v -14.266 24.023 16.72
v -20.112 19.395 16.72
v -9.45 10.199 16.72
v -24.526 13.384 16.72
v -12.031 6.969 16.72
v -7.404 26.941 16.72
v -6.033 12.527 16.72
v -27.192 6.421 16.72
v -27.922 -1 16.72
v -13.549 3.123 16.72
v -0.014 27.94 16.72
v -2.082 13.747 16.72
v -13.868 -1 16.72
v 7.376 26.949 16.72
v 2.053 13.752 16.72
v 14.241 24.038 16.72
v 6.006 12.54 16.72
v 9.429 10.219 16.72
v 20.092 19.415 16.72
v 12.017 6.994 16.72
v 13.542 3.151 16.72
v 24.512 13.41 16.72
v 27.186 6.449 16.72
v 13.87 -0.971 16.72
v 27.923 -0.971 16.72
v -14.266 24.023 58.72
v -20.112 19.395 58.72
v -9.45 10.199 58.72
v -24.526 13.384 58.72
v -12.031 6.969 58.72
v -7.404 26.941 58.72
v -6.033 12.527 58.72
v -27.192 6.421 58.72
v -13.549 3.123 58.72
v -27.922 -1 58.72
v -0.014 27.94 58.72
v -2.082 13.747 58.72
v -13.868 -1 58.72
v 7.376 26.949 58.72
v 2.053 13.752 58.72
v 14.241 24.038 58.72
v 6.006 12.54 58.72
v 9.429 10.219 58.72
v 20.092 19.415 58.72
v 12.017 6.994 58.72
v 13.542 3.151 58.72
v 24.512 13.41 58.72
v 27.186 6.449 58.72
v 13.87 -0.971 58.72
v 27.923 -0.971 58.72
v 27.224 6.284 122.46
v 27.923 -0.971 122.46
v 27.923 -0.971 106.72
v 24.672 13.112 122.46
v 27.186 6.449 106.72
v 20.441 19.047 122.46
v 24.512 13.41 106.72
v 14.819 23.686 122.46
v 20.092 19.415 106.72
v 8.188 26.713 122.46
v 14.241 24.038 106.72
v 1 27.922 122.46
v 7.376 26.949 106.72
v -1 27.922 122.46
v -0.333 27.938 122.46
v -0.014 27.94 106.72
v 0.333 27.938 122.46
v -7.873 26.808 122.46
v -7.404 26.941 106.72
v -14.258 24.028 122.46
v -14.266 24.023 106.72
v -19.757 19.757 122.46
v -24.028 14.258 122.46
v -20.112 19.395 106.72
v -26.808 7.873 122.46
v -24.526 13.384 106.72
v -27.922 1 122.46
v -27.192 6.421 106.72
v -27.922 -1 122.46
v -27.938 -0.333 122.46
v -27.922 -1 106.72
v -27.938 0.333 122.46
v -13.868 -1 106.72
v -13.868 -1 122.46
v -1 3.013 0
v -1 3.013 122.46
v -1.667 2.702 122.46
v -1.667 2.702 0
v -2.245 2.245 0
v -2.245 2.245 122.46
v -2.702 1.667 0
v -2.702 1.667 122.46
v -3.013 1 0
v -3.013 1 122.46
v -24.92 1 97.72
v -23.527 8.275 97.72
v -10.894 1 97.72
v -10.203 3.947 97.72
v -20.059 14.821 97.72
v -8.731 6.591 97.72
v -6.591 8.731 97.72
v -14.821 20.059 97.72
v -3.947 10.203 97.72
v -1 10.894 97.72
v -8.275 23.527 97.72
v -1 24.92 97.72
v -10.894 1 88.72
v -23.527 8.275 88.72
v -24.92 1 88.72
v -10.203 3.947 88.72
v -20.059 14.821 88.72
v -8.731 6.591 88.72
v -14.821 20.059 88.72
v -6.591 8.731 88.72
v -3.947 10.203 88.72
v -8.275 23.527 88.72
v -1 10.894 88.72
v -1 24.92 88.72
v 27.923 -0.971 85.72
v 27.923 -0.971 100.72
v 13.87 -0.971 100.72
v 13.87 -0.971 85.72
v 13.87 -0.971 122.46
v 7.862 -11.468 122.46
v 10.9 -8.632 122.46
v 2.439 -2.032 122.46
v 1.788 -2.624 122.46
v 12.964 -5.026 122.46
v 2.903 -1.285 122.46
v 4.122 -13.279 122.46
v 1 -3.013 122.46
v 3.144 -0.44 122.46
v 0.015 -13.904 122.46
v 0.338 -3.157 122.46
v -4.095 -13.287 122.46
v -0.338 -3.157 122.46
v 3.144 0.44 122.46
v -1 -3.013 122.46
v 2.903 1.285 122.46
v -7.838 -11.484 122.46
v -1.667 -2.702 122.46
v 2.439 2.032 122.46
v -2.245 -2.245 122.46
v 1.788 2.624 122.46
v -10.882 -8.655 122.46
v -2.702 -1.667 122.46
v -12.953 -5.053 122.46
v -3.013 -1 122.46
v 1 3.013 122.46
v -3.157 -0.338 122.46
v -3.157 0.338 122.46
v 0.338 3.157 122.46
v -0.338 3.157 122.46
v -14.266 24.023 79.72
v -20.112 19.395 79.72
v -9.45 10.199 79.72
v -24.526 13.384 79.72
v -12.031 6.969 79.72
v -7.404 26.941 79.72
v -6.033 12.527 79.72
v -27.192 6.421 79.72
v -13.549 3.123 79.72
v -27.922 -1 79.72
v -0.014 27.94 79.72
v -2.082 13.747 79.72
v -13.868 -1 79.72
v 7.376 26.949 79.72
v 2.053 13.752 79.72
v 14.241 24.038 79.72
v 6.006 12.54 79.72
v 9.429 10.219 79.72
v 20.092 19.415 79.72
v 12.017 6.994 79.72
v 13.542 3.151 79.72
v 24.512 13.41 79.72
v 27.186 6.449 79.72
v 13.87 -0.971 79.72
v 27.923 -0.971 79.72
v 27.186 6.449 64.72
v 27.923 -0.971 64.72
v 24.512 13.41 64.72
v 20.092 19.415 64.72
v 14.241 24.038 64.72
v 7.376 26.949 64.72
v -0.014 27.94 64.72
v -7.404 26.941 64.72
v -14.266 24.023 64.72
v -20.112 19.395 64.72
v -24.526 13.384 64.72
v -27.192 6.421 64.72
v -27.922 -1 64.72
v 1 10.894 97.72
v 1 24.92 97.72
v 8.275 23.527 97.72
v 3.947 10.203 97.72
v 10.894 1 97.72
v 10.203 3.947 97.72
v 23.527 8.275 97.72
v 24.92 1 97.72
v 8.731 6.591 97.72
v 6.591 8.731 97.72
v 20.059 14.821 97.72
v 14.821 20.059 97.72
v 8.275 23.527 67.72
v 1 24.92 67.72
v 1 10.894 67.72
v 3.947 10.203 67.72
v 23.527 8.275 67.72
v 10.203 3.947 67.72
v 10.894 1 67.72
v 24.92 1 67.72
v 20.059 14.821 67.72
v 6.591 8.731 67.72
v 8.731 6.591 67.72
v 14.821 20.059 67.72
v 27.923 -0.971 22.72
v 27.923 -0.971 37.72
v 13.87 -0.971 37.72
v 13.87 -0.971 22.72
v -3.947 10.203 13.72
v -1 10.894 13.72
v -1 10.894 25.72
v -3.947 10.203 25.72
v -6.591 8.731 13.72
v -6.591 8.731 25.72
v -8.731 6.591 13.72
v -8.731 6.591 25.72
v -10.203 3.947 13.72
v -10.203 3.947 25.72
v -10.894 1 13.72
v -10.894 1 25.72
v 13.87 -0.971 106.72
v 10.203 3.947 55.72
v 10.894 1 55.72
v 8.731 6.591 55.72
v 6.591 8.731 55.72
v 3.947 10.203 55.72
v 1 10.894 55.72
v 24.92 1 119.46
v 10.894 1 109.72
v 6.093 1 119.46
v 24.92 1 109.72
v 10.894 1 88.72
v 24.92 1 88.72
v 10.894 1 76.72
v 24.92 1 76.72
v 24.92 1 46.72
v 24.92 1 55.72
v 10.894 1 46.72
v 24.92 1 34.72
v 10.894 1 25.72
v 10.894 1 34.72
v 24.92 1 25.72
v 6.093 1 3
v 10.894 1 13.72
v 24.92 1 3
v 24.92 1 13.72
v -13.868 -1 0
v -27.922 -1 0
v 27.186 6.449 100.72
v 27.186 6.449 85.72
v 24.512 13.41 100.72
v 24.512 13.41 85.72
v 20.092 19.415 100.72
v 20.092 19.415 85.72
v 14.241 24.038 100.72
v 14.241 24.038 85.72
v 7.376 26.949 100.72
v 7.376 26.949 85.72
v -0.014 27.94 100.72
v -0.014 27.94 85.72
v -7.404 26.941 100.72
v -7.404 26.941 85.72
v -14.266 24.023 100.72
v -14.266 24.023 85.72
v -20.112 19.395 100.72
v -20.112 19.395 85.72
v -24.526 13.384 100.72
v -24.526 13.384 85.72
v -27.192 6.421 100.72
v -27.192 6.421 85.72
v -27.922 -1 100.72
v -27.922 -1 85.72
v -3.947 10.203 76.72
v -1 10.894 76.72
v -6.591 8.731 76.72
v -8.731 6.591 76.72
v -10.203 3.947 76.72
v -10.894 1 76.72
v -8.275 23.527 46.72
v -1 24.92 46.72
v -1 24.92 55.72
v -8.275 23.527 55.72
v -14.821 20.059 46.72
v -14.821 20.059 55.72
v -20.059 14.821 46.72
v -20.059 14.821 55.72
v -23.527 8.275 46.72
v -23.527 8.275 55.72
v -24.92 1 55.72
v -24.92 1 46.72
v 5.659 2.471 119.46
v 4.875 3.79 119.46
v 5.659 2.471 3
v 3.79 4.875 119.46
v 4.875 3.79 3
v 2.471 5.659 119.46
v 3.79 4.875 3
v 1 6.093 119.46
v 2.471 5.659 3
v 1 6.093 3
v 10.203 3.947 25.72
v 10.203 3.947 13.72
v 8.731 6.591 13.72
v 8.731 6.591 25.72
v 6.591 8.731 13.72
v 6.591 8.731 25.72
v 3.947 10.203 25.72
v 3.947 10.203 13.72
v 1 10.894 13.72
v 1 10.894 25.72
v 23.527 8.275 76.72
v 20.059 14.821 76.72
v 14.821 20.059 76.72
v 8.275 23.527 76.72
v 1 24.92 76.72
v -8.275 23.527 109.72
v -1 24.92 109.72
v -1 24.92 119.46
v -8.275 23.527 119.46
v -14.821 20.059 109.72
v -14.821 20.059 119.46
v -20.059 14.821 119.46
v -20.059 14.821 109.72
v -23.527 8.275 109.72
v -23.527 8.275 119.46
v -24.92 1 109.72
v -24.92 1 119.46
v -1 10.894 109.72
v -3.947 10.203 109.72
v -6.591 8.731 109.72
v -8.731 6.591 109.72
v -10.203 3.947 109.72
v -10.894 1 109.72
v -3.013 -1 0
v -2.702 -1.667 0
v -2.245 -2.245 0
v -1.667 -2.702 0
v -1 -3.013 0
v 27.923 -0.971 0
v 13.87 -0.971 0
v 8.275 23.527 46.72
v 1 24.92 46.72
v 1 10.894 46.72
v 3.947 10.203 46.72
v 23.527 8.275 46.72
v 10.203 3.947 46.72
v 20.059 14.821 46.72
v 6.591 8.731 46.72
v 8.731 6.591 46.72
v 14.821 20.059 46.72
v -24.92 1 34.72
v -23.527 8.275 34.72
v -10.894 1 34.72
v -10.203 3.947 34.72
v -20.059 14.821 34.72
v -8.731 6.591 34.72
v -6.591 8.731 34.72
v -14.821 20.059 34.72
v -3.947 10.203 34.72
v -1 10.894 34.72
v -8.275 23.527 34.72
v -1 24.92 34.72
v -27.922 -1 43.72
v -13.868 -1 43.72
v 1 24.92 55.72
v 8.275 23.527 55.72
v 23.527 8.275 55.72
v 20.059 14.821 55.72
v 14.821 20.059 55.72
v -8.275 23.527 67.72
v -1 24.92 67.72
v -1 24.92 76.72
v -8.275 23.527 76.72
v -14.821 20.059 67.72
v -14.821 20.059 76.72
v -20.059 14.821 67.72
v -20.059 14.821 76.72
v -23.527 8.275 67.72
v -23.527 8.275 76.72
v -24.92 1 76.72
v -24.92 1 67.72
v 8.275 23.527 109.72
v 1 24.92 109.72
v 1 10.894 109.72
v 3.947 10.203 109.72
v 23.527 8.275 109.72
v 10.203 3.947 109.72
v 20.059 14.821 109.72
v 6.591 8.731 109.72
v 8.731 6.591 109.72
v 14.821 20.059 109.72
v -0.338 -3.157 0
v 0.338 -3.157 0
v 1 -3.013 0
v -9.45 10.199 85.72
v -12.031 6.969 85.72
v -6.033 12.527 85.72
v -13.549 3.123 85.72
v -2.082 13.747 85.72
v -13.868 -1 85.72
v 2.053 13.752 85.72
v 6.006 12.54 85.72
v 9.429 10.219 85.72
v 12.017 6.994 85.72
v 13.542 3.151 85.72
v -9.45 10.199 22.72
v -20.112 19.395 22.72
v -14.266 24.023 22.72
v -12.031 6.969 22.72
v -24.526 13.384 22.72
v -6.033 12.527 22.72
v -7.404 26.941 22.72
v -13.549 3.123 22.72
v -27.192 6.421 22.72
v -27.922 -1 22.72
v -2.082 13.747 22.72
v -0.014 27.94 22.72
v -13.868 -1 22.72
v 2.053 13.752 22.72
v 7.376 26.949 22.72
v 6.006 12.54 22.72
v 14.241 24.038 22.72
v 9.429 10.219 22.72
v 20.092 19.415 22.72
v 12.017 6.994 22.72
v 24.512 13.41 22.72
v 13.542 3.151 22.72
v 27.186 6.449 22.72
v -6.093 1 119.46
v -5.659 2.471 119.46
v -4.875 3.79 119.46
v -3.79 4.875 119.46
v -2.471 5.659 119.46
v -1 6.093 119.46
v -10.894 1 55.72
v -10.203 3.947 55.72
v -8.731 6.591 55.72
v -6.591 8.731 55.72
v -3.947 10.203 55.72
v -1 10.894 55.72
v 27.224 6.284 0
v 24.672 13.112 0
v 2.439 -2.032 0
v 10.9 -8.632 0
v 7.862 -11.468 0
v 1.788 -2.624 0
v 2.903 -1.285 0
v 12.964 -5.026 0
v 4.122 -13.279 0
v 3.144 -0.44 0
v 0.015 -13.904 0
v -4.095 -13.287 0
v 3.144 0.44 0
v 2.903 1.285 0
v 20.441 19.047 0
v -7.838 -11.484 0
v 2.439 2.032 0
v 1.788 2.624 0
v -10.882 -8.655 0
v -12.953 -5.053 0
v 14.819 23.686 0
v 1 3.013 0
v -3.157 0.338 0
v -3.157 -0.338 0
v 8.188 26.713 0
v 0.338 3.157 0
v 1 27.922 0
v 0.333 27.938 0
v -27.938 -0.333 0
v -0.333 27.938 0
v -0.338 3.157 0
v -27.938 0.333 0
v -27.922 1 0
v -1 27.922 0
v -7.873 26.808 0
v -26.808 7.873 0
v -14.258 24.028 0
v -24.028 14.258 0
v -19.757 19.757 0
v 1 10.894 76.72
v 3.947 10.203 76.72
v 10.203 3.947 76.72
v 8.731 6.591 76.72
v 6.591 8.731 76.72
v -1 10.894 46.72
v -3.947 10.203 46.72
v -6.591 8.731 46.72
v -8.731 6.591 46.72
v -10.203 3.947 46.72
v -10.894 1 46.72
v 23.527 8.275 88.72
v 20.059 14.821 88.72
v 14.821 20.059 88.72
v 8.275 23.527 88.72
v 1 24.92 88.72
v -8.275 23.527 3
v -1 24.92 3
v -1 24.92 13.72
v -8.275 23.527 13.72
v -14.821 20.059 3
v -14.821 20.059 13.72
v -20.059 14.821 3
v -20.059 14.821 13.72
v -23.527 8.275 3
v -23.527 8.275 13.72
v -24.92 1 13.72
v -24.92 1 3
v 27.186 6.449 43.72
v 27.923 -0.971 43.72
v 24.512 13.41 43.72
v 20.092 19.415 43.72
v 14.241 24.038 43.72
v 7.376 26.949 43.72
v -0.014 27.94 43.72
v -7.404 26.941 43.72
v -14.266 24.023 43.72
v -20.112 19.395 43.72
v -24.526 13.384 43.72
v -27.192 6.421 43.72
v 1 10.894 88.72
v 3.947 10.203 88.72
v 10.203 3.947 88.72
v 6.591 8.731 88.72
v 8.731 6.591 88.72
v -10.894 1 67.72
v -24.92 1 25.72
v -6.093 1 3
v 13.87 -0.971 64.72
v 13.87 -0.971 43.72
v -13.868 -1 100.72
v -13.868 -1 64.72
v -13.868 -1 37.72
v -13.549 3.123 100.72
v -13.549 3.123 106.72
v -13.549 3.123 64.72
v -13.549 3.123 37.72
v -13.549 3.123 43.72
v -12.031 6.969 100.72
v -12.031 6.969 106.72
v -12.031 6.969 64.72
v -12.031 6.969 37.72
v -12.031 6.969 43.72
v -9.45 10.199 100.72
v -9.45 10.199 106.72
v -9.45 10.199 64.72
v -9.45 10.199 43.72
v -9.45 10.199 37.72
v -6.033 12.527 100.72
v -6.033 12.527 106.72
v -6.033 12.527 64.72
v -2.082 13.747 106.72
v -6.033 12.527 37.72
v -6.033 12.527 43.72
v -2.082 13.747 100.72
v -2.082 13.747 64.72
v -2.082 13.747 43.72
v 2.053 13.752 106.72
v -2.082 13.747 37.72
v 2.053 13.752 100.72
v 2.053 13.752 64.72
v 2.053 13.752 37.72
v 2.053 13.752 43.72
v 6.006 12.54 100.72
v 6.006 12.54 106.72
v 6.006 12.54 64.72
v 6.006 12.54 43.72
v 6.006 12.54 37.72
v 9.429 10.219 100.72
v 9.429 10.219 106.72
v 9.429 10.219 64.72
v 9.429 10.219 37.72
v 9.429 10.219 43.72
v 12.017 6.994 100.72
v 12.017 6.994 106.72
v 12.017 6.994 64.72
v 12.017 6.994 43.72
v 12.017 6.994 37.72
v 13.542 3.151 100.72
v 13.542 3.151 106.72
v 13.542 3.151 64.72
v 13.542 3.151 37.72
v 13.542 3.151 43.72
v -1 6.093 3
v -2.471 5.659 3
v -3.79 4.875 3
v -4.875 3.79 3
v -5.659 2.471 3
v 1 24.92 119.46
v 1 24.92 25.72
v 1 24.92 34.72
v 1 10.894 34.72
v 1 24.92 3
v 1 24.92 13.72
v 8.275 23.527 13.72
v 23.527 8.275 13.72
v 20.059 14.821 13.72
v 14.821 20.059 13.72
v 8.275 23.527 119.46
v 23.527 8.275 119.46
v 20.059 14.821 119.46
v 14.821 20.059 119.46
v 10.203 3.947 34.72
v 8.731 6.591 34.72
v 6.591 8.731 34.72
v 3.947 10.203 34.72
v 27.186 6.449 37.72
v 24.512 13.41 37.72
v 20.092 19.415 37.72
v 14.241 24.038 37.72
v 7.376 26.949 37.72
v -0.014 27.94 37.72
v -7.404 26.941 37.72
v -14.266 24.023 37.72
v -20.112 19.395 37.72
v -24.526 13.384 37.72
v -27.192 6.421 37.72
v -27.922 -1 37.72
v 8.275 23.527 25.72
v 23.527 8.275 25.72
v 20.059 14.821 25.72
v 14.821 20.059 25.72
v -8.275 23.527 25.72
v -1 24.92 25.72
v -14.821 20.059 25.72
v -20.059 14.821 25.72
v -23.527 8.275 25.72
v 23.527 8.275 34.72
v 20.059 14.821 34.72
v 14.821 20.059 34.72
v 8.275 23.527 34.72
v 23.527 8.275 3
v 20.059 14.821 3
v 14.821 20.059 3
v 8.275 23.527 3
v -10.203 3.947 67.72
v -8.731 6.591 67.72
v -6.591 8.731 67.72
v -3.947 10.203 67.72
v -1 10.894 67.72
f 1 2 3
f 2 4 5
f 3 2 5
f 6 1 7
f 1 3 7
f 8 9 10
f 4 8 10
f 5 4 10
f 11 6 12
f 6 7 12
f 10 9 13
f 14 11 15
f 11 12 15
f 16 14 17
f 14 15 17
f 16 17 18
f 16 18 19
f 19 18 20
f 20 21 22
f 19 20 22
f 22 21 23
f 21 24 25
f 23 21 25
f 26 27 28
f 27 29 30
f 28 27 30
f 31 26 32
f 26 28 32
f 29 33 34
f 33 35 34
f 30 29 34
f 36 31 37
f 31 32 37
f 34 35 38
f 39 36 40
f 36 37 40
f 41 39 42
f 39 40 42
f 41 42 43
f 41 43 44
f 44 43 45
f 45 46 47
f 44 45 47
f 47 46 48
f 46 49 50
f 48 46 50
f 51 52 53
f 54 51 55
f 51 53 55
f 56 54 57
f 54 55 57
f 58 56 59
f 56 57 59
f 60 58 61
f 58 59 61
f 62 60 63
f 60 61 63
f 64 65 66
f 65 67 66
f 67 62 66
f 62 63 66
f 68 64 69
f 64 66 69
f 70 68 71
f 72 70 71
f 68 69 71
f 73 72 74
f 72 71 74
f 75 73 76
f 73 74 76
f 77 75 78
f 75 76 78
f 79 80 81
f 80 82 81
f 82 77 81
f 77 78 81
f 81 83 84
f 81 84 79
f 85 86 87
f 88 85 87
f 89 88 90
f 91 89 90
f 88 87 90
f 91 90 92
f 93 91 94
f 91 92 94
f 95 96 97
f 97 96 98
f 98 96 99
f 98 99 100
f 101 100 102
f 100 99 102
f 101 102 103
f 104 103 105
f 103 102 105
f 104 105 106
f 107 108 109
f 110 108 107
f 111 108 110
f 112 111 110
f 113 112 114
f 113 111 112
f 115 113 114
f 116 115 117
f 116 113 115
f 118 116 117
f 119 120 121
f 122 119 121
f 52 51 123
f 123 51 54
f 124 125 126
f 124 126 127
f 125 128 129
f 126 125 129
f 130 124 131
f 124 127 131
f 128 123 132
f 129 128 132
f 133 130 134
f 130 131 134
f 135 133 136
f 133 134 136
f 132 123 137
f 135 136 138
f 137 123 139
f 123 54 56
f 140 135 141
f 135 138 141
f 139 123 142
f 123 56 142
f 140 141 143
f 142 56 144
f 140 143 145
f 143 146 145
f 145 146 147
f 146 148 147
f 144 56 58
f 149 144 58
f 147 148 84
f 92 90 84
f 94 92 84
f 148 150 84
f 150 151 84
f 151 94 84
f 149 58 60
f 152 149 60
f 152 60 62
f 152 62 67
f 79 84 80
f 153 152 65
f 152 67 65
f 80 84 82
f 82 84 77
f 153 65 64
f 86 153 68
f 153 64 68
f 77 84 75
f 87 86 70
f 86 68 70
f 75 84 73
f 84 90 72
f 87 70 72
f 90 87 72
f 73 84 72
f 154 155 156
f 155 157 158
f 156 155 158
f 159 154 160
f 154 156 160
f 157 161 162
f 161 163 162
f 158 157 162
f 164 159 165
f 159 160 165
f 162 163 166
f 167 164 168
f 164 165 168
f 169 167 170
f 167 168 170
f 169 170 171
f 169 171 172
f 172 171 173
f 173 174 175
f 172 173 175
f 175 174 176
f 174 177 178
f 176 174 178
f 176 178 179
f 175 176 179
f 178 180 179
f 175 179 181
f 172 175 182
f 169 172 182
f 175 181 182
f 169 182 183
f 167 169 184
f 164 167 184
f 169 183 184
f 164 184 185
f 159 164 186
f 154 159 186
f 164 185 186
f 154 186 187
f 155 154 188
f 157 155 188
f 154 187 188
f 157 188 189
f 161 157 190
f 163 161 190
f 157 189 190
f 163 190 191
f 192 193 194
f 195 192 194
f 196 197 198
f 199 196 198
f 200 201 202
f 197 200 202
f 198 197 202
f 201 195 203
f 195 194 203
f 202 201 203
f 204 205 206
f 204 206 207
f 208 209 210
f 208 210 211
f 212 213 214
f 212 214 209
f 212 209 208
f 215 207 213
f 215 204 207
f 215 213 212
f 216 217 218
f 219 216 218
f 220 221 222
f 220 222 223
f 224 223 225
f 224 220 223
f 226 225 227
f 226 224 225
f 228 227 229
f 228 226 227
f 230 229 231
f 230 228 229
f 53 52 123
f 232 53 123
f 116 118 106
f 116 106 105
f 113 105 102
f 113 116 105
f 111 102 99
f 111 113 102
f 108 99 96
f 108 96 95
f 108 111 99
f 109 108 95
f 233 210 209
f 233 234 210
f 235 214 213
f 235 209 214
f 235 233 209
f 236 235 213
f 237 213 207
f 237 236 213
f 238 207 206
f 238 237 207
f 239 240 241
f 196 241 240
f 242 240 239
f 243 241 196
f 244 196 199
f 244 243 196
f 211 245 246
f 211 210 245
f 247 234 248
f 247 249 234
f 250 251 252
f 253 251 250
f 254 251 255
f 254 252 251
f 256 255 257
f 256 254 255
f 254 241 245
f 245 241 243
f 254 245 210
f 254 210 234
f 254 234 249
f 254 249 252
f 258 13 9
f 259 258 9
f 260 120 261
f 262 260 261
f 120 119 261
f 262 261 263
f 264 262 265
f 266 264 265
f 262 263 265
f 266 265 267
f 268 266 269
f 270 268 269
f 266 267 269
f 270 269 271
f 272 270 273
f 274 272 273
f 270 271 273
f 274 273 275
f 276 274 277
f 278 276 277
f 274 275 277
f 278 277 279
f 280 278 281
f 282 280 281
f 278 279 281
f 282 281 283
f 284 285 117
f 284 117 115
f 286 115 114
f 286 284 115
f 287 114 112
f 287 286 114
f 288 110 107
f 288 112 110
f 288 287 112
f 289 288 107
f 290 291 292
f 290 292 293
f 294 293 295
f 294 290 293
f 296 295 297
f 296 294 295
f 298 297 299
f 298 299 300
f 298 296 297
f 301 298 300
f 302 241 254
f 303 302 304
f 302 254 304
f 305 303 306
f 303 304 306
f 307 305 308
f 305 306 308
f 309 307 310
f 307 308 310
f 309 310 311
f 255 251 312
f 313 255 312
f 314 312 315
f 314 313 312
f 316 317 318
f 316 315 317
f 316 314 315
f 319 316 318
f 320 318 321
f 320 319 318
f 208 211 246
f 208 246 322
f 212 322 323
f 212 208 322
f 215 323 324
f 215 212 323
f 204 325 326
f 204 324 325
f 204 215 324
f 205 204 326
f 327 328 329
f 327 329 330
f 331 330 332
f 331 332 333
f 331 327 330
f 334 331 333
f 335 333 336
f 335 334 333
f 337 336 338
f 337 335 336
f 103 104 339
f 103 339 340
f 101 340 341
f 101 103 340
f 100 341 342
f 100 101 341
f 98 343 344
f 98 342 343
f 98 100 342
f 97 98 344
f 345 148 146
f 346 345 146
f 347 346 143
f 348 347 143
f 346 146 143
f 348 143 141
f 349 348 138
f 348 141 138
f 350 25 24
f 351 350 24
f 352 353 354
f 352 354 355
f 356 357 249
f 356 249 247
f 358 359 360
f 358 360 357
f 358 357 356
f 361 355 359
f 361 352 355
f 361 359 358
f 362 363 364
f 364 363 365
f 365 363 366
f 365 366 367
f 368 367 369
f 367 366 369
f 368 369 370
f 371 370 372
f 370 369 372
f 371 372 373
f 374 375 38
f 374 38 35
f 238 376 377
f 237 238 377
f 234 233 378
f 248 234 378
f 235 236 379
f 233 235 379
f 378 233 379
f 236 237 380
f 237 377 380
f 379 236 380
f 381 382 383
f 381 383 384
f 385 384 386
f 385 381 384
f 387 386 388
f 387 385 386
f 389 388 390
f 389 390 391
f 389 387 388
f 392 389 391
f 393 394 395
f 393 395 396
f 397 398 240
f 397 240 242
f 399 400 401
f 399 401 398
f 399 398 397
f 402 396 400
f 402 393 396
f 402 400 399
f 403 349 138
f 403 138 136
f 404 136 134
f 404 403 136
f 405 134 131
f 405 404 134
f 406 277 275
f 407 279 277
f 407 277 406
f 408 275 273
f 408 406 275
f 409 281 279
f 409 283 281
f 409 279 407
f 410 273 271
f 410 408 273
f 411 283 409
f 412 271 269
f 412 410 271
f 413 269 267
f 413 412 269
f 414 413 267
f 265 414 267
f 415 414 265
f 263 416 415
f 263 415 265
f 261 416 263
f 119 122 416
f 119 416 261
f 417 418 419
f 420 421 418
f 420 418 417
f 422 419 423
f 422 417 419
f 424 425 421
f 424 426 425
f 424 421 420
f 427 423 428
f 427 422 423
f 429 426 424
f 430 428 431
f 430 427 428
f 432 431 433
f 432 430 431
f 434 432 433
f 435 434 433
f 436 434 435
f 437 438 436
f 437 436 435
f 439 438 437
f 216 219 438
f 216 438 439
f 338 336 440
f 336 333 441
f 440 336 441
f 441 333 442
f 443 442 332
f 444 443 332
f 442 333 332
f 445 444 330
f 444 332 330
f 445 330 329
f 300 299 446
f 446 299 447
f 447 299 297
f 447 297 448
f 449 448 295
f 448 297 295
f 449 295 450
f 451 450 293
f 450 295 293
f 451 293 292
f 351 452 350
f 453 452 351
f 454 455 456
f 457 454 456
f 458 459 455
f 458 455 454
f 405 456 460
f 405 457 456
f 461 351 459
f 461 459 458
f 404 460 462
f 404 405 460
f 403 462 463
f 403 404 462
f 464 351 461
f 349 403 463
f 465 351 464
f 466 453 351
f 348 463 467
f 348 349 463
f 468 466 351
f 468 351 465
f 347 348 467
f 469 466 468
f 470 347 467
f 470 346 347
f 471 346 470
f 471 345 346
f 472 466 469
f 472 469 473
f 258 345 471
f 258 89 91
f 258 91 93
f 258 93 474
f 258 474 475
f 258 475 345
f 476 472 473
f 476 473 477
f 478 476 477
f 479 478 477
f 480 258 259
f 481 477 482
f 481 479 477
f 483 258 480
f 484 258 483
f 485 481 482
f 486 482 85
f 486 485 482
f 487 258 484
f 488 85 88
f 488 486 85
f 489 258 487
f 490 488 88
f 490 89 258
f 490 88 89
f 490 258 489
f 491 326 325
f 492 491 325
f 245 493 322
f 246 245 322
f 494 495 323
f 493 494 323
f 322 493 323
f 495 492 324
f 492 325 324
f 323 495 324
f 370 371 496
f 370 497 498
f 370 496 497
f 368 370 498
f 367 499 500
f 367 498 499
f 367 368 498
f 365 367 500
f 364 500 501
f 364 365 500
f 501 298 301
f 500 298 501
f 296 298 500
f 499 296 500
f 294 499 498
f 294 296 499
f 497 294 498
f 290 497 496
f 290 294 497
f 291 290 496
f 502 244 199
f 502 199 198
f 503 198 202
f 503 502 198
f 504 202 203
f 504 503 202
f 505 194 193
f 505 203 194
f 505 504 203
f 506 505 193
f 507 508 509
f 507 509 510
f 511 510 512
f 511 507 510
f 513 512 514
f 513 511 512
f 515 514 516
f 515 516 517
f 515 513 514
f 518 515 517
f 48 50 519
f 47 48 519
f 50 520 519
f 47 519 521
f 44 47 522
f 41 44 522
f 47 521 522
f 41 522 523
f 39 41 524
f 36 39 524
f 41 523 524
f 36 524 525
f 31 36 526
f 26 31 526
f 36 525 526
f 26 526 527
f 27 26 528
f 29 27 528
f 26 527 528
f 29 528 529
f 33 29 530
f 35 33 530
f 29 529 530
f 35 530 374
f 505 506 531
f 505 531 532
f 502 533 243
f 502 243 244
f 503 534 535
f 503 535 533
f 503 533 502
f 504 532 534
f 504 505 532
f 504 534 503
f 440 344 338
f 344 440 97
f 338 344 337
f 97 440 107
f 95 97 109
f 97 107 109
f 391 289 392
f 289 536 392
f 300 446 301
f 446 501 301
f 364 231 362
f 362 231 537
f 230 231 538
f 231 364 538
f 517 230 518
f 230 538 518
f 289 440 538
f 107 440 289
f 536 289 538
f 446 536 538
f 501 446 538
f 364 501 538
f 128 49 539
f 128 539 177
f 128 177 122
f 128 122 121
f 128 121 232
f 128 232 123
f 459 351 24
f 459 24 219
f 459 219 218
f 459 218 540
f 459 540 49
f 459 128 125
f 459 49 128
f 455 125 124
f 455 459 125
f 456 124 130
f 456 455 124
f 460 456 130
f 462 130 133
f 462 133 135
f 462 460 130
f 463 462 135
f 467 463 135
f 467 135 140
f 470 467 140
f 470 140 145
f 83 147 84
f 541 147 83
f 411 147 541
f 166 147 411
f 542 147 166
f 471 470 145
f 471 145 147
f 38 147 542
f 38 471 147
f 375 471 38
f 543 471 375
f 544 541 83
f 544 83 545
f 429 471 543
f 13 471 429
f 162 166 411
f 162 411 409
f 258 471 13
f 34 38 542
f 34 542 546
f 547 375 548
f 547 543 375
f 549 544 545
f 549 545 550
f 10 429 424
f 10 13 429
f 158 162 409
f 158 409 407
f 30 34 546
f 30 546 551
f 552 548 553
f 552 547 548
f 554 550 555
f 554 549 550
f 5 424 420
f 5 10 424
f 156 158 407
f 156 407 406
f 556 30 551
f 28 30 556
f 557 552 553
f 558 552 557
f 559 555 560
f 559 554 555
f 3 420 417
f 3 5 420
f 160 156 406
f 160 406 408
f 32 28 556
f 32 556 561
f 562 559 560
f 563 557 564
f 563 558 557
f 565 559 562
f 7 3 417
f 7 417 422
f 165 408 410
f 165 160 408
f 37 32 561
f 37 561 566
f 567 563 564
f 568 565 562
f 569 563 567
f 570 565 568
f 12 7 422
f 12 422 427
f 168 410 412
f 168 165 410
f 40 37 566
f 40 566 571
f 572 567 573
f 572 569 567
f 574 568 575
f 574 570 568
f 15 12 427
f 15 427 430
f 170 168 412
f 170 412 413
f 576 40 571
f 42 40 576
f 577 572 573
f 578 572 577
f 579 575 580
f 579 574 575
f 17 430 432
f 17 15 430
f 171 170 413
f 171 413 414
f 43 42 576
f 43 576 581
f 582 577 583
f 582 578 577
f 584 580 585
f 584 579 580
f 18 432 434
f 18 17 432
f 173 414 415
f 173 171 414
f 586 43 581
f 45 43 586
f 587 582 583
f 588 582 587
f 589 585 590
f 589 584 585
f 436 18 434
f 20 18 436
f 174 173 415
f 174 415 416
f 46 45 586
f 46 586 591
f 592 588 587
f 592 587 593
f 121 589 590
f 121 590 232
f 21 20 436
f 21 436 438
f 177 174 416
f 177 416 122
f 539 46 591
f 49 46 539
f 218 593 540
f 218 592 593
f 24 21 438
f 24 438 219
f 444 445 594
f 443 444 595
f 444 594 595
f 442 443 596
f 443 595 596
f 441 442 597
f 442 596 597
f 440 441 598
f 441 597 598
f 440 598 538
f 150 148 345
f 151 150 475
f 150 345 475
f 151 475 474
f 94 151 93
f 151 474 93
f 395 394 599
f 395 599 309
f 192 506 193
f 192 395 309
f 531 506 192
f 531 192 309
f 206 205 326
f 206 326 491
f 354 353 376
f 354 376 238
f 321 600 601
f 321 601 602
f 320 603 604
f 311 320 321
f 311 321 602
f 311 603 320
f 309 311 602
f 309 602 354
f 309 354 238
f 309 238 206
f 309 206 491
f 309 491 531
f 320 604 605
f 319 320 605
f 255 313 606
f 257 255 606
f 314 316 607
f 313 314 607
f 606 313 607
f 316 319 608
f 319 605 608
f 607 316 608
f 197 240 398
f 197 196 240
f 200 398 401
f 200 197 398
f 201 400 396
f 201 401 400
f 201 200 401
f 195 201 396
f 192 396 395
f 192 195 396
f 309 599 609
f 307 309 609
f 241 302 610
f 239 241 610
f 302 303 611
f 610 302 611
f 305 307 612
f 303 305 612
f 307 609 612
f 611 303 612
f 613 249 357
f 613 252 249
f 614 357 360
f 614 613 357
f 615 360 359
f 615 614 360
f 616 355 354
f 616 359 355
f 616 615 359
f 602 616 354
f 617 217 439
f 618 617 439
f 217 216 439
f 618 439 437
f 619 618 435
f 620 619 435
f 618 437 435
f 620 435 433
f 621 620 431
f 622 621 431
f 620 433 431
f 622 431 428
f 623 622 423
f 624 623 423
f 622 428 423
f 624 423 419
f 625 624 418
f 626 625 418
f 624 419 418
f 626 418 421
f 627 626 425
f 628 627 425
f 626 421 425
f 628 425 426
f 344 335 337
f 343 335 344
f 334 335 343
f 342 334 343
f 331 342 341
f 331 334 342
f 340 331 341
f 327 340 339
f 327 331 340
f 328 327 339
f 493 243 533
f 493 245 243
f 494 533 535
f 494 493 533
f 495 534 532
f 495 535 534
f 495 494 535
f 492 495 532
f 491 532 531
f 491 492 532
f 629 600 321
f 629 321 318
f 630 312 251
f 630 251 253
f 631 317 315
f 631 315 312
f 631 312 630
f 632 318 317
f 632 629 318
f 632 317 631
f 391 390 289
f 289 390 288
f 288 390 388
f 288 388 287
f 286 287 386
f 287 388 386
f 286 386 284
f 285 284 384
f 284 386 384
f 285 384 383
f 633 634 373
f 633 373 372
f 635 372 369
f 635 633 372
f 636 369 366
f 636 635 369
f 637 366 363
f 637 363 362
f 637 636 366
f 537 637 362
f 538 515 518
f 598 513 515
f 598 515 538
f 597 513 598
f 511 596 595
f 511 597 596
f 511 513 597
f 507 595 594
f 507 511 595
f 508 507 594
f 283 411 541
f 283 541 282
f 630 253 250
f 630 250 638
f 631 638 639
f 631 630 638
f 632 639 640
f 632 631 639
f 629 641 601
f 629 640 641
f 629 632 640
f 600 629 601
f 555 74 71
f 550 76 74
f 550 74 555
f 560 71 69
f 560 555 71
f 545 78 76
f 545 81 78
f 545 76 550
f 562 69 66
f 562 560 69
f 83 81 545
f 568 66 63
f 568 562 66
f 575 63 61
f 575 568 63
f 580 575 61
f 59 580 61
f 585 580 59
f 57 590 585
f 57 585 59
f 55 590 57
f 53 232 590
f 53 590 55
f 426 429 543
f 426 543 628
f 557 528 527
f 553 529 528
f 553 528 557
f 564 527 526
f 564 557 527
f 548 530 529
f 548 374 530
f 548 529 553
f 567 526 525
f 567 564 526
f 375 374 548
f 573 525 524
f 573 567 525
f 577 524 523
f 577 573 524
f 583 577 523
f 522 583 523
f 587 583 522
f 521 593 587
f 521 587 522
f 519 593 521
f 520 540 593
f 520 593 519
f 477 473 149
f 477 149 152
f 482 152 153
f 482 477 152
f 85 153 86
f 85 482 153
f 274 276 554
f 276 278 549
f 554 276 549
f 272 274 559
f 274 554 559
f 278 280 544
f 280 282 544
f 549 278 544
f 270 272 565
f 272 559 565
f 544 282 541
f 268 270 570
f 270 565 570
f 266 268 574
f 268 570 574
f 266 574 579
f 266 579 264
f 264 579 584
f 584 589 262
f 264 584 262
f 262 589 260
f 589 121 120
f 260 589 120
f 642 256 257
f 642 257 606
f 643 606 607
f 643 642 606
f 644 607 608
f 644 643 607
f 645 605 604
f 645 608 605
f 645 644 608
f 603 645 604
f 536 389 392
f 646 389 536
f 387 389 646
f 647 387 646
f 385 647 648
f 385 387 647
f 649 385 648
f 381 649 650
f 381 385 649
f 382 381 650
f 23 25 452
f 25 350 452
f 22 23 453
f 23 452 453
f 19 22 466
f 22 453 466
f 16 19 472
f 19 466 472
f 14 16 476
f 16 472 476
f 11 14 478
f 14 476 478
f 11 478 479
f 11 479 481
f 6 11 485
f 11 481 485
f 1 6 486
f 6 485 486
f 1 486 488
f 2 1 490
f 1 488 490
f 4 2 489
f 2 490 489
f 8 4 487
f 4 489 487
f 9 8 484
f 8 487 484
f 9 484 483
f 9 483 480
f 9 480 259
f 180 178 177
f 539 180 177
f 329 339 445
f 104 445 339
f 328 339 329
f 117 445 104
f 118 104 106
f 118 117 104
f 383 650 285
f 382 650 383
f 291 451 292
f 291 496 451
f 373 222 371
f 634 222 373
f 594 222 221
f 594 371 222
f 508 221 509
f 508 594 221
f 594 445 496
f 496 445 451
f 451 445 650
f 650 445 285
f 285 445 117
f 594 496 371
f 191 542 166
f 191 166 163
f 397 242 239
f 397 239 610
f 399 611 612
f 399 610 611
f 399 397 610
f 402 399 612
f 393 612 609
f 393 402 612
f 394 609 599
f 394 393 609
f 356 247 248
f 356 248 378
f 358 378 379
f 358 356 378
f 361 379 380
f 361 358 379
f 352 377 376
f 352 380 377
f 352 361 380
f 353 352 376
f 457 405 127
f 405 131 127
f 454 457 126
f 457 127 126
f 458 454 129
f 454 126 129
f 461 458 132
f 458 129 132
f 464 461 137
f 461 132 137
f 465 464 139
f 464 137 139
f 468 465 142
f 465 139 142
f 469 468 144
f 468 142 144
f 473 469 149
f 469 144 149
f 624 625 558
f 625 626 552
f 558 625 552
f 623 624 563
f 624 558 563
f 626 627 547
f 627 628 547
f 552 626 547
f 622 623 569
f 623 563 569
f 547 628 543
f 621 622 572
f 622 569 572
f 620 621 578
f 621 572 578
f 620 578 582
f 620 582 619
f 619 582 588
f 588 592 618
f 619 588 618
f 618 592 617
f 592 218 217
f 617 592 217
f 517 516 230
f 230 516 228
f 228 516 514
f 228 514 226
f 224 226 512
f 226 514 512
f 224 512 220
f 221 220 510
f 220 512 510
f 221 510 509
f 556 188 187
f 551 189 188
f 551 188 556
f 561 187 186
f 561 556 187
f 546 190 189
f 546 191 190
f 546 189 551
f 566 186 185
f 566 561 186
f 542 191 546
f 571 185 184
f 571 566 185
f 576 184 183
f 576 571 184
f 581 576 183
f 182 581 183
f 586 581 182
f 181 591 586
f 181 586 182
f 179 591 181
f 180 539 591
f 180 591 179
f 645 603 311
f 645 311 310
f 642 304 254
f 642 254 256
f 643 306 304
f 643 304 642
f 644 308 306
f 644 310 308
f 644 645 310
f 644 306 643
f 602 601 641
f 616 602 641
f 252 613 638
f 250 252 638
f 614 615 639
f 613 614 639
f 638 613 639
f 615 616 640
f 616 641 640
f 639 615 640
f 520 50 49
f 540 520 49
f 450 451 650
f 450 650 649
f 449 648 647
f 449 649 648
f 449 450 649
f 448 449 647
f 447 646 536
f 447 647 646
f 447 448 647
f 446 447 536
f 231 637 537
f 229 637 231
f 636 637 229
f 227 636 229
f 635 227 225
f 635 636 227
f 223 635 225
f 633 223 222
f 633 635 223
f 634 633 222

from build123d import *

# Parameters (mm, degrees)
SKETCH3_R            = 27.94
BOSS_EXTRUDE2_DEPTH  = 122.46
SKETCH5_R            = 3.175
CUT_EXTRUDE1_DEPTH   = 129.676877488
SKETCH4_W            = 14
SKETCH4_H            = 6
SHELL1_START         = 3
SHELL1_OUTLINE_R     = 10.94
SHELL1_OUTLINE_R_2   = 6.175
SHELL1_DEPTH         = 116.46
SHELL1_2_OUTLINE_R   = 24.94
SHELL1_2_OUTLINE_R_2 = 10.94
SHELL1_2_DEPTH       = 10.72
SHELL1_START_2       = 109.72
SHELL1_3_OUTLINE_R   = 24.94
SHELL1_3_OUTLINE_R_2 = 10.94
SHELL1_3_DEPTH       = 9.74
SHELL1_START_3       = 25.72
SHELL1_4_OUTLINE_R   = 24.94
SHELL1_4_OUTLINE_R_2 = 10.94
SHELL1_4_DEPTH       = 9
SHELL1_START_4       = 46.72
SHELL1_5_OUTLINE_R   = 24.94
SHELL1_5_OUTLINE_R_2 = 10.94
SHELL1_5_DEPTH       = 9
SHELL1_START_5       = 67.72
SHELL1_6_OUTLINE_R   = 24.94
SHELL1_6_OUTLINE_R_2 = 10.94
SHELL1_6_DEPTH       = 9
SHELL1_START_6       = 88.72
SHELL1_7_OUTLINE_R   = 24.94
SHELL1_7_OUTLINE_R_2 = 10.94
SHELL1_7_DEPTH       = 9
BOSS_EXTRUDE3_REACH  = 130.677
SKETCH13_W           = 16.483162312
SKETCH13_H           = 6
CUT_EXTRUDE3_DEPTH   = 123
BOSS_EXTRUDE5_START  = -122.46
BOSS_EXTRUDE5_DEPTH  = 122.46


# Read off the part's stored shape, not the designer's step: Shell1
with BuildPart() as part:
    # Sketch3 → Boss-Extrude2 (new body)
    with BuildSketch(Plane.XY):
        Circle(SKETCH3_R)
    extrude(amount=BOSS_EXTRUDE2_DEPTH)

    # Sketch5 → Cut-Extrude1 (cut, through all)
    with BuildSketch(Plane.XY.offset(122.46)):
        Circle(SKETCH5_R)
    extrude(amount=-CUT_EXTRUDE1_DEPTH, mode=Mode.SUBTRACT)

    # Sketch4 → Cut-Revolve1 (revolve, cut)
    with BuildSketch(Plane(origin=(0, 0, 0), x_dir=(1, 0, 0), z_dir=(0, 1, 0)), mode=Mode.PRIVATE) as cut_revolve1_sk:
        with Locations((-20.94, -103.72)):
            Rectangle(SKETCH4_W, SKETCH4_H)
        with Locations((-20.94, -82.72)):
            Rectangle(SKETCH4_W, SKETCH4_H)
        with Locations((-20.94, -61.72)):
            Rectangle(SKETCH4_W, SKETCH4_H)
        with Locations((-20.94, -40.72)):
            Rectangle(SKETCH4_W, SKETCH4_H)
        with Locations((-20.94, -19.72)):
            Rectangle(SKETCH4_W, SKETCH4_H)
    revolve(cut_revolve1_sk.sketch.rotate(Axis((0, 0, 122.46), (0, 0, -1)), 180), axis=Axis((0, 0, 122.46), (0, 0, -1)), mode=Mode.SUBTRACT)

    # Shell1 outline → Shell1 (cut)
    with BuildSketch(Plane.XY.offset(SHELL1_START)):
        Circle(SHELL1_OUTLINE_R)
        Circle(SHELL1_OUTLINE_R_2, mode=Mode.SUBTRACT)
    extrude(amount=SHELL1_DEPTH, mode=Mode.SUBTRACT)

    # Shell1 2 outline → Shell1 2 (cut)
    with BuildSketch(Plane.XY.offset(SHELL1_START)):
        Circle(SHELL1_2_OUTLINE_R)
        Circle(SHELL1_2_OUTLINE_R_2, mode=Mode.SUBTRACT)
    extrude(amount=SHELL1_2_DEPTH, mode=Mode.SUBTRACT)

    # Shell1 3 outline → Shell1 3 (cut)
    with BuildSketch(Plane.XY.offset(SHELL1_START_2)):
        Circle(SHELL1_3_OUTLINE_R)
        Circle(SHELL1_3_OUTLINE_R_2, mode=Mode.SUBTRACT)
    extrude(amount=SHELL1_3_DEPTH, mode=Mode.SUBTRACT)

    # Shell1 4 outline → Shell1 4 (cut)
    with BuildSketch(Plane.XY.offset(SHELL1_START_3)):
        Circle(SHELL1_4_OUTLINE_R)
        Circle(SHELL1_4_OUTLINE_R_2, mode=Mode.SUBTRACT)
    extrude(amount=SHELL1_4_DEPTH, mode=Mode.SUBTRACT)

    # Shell1 5 outline → Shell1 5 (cut)
    with BuildSketch(Plane.XY.offset(SHELL1_START_4)):
        Circle(SHELL1_5_OUTLINE_R)
        Circle(SHELL1_5_OUTLINE_R_2, mode=Mode.SUBTRACT)
    extrude(amount=SHELL1_5_DEPTH, mode=Mode.SUBTRACT)

    # Shell1 6 outline → Shell1 6 (cut)
    with BuildSketch(Plane.XY.offset(SHELL1_START_5)):
        Circle(SHELL1_6_OUTLINE_R)
        Circle(SHELL1_6_OUTLINE_R_2, mode=Mode.SUBTRACT)
    extrude(amount=SHELL1_6_DEPTH, mode=Mode.SUBTRACT)

    # Shell1 7 outline → Shell1 7 (cut)
    with BuildSketch(Plane.XY.offset(SHELL1_START_6)):
        Circle(SHELL1_7_OUTLINE_R)
        Circle(SHELL1_7_OUTLINE_R_2, mode=Mode.SUBTRACT)
    extrude(amount=SHELL1_7_DEPTH, mode=Mode.SUBTRACT)

    # Boss-Extrude3: up to this face of the body (flat: up to its plane)
    boss_extrude3_end = Plane(part.part.faces().sort_by_distance((-27.149737461, 0, 122.46))[0])
    # Sketch10 → Boss-Extrude3 (add, up to the picked face)
    with BuildSketch(Plane(origin=(0, 0, 0), x_dir=(-1, 0, 0), z_dir=(0, 0, -1)), mode=Mode.PRIVATE) as boss_extrude3_sk1:
        with BuildLine():
            Line((-1, 27.922098775), (-1, 3.01340754))
            ThreePointArc((-1, 3.01340754), (0, 3.175), (1, 3.01340754))
            Line((1, 3.01340754), (1, 27.922098775))
            ThreePointArc((1, 27.922098775), (0, 27.94), (-1, 27.922098775))
        make_face()
    boss_extrude3_tool1 = split(extrude(boss_extrude3_sk1.sketch, amount=-BOSS_EXTRUDE3_REACH, mode=Mode.PRIVATE), bisect_by=boss_extrude3_end, keep=Keep.BOTH, mode=Mode.PRIVATE)
    # Sketch10 → Boss-Extrude3 (add, up to the picked face)
    with BuildSketch(Plane(origin=(0, 0, 0), x_dir=(-1, 0, 0), z_dir=(0, 0, -1)), mode=Mode.PRIVATE) as boss_extrude3_sk2:
        with BuildLine():
            Line((3.01340754, 1), (27.922098775, 1))
            ThreePointArc((27.922098775, 1), (27.94, 0), (27.922098775, -1))
            Line((27.922098775, -1), (3.01340754, -1))
            ThreePointArc((3.01340754, -1), (3.175, 0), (3.01340754, 1))
        make_face()
    boss_extrude3_tool2 = split(extrude(boss_extrude3_sk2.sketch, amount=-BOSS_EXTRUDE3_REACH, mode=Mode.PRIVATE), bisect_by=boss_extrude3_end, keep=Keep.BOTH, mode=Mode.PRIVATE)
    # Sketch10 → Boss-Extrude3 (add, up to the picked face)
    with BuildSketch(Plane(origin=(0, 0, 0), x_dir=(-1, 0, 0), z_dir=(0, 0, -1)), mode=Mode.PRIVATE) as boss_extrude3_sk3:
        with BuildLine():
            Line((-1, -3.01340754), (-1, -27.922098775))
            ThreePointArc((-1, -27.922098775), (0, -27.94), (1, -27.922098775))
            Line((1, -27.922098775), (1, -3.01340754))
            ThreePointArc((1, -3.01340754), (0, -3.175), (-1, -3.01340754))
        make_face()
    boss_extrude3_tool3 = split(extrude(boss_extrude3_sk3.sketch, amount=-BOSS_EXTRUDE3_REACH, mode=Mode.PRIVATE), bisect_by=boss_extrude3_end, keep=Keep.BOTH, mode=Mode.PRIVATE)
    # Sketch10 → Boss-Extrude3 (add, up to the picked face)
    with BuildSketch(Plane(origin=(0, 0, 0), x_dir=(-1, 0, 0), z_dir=(0, 0, -1)), mode=Mode.PRIVATE) as boss_extrude3_sk4:
        with BuildLine():
            Line((-27.922098775, -1), (-3.01340754, -1))
            ThreePointArc((-3.01340754, -1), (-3.175, 0), (-3.01340754, 1))
            Line((-3.01340754, 1), (-27.922098775, 1))
            ThreePointArc((-27.922098775, 1), (-27.94, 0), (-27.922098775, -1))
        make_face()
    boss_extrude3_tool4 = split(extrude(boss_extrude3_sk4.sketch, amount=-BOSS_EXTRUDE3_REACH, mode=Mode.PRIVATE), bisect_by=boss_extrude3_end, keep=Keep.BOTH, mode=Mode.PRIVATE)
    add(boss_extrude3_tool1.solids().sort_by(Axis((0, 15.527819, 0), (0, 0, 1)))[0])
    add(boss_extrude3_tool2.solids().sort_by(Axis((-15.527819, 0, 0), (0, 0, 1)))[0])
    add(boss_extrude3_tool3.solids().sort_by(Axis((0, -15.527819, 0), (0, 0, 1)))[0])
    add(boss_extrude3_tool4.solids().sort_by(Axis((15.527819, 0, 0), (0, 0, 1)))[0])

    # Sketch13 → Cut-Revolve2 (revolve, cut)
    with BuildSketch(Plane(origin=(0, 0, 0), x_dir=(1, 0, 0), z_dir=(0, 1, 0)), mode=Mode.PRIVATE) as cut_revolve2_sk:
        with Locations((-22.145666886, -40.72)):
            Rectangle(SKETCH13_W, SKETCH13_H)
        with Locations((-22.145666886, -19.72)):
            Rectangle(SKETCH13_W, SKETCH13_H)
        with Locations((-22.145666886, -61.72)):
            Rectangle(SKETCH13_W, SKETCH13_H)
        with Locations((-22.145666886, -82.72)):
            Rectangle(SKETCH13_W, SKETCH13_H)
        with Locations((-22.145666886, -103.72)):
            Rectangle(SKETCH13_W, SKETCH13_H)
    revolve(cut_revolve2_sk.sketch.rotate(Axis((0, 0, 121.588746248), (0, 0, -1)), 180), axis=Axis((0, 0, 121.588746248), (0, 0, -1)), mode=Mode.SUBTRACT)

    # Sketch16 → Cut-Extrude3 (cut)
    with BuildSketch(Plane(origin=(0, 0, 0), x_dir=(-1, 0, 0), z_dir=(0, 0, -1))):
        with BuildLine():
            Line((-27.923120749, -0.971044624), (-6.098171639, -0.971044624))
            ThreePointArc((-6.098171639, -0.971044624), (-0.014665674, -6.174982584), (6.093490379, -1))
            Line((6.093490379, -1), (27.922098775, -1))
            ThreePointArc((27.922098775, -1), (-0.014486703, -27.939996244), (-27.923120749, -0.971044624))
        make_face()
    extrude(amount=-CUT_EXTRUDE3_DEPTH, mode=Mode.SUBTRACT)

    # Sketch18 → Boss-Extrude5 (add)
    with BuildSketch(Plane(origin=(0, 0, 0), x_dir=(-1, 0, 0), z_dir=(0, 0, -1)).offset(BOSS_EXTRUDE5_START)):
        with BuildLine():
            Line((-3.175, 0), (-13.90408573, 0))
            ThreePointArc((-13.90408573, 0), (0, -13.90408573), (13.90408573, 0))
            Line((13.90408573, 0), (3.175, 0))
            ThreePointArc((3.175, 0), (0, -3.175), (-3.175, 0))
        make_face()
    extrude(amount=BOSS_EXTRUDE5_DEPTH)


solid = part.part
